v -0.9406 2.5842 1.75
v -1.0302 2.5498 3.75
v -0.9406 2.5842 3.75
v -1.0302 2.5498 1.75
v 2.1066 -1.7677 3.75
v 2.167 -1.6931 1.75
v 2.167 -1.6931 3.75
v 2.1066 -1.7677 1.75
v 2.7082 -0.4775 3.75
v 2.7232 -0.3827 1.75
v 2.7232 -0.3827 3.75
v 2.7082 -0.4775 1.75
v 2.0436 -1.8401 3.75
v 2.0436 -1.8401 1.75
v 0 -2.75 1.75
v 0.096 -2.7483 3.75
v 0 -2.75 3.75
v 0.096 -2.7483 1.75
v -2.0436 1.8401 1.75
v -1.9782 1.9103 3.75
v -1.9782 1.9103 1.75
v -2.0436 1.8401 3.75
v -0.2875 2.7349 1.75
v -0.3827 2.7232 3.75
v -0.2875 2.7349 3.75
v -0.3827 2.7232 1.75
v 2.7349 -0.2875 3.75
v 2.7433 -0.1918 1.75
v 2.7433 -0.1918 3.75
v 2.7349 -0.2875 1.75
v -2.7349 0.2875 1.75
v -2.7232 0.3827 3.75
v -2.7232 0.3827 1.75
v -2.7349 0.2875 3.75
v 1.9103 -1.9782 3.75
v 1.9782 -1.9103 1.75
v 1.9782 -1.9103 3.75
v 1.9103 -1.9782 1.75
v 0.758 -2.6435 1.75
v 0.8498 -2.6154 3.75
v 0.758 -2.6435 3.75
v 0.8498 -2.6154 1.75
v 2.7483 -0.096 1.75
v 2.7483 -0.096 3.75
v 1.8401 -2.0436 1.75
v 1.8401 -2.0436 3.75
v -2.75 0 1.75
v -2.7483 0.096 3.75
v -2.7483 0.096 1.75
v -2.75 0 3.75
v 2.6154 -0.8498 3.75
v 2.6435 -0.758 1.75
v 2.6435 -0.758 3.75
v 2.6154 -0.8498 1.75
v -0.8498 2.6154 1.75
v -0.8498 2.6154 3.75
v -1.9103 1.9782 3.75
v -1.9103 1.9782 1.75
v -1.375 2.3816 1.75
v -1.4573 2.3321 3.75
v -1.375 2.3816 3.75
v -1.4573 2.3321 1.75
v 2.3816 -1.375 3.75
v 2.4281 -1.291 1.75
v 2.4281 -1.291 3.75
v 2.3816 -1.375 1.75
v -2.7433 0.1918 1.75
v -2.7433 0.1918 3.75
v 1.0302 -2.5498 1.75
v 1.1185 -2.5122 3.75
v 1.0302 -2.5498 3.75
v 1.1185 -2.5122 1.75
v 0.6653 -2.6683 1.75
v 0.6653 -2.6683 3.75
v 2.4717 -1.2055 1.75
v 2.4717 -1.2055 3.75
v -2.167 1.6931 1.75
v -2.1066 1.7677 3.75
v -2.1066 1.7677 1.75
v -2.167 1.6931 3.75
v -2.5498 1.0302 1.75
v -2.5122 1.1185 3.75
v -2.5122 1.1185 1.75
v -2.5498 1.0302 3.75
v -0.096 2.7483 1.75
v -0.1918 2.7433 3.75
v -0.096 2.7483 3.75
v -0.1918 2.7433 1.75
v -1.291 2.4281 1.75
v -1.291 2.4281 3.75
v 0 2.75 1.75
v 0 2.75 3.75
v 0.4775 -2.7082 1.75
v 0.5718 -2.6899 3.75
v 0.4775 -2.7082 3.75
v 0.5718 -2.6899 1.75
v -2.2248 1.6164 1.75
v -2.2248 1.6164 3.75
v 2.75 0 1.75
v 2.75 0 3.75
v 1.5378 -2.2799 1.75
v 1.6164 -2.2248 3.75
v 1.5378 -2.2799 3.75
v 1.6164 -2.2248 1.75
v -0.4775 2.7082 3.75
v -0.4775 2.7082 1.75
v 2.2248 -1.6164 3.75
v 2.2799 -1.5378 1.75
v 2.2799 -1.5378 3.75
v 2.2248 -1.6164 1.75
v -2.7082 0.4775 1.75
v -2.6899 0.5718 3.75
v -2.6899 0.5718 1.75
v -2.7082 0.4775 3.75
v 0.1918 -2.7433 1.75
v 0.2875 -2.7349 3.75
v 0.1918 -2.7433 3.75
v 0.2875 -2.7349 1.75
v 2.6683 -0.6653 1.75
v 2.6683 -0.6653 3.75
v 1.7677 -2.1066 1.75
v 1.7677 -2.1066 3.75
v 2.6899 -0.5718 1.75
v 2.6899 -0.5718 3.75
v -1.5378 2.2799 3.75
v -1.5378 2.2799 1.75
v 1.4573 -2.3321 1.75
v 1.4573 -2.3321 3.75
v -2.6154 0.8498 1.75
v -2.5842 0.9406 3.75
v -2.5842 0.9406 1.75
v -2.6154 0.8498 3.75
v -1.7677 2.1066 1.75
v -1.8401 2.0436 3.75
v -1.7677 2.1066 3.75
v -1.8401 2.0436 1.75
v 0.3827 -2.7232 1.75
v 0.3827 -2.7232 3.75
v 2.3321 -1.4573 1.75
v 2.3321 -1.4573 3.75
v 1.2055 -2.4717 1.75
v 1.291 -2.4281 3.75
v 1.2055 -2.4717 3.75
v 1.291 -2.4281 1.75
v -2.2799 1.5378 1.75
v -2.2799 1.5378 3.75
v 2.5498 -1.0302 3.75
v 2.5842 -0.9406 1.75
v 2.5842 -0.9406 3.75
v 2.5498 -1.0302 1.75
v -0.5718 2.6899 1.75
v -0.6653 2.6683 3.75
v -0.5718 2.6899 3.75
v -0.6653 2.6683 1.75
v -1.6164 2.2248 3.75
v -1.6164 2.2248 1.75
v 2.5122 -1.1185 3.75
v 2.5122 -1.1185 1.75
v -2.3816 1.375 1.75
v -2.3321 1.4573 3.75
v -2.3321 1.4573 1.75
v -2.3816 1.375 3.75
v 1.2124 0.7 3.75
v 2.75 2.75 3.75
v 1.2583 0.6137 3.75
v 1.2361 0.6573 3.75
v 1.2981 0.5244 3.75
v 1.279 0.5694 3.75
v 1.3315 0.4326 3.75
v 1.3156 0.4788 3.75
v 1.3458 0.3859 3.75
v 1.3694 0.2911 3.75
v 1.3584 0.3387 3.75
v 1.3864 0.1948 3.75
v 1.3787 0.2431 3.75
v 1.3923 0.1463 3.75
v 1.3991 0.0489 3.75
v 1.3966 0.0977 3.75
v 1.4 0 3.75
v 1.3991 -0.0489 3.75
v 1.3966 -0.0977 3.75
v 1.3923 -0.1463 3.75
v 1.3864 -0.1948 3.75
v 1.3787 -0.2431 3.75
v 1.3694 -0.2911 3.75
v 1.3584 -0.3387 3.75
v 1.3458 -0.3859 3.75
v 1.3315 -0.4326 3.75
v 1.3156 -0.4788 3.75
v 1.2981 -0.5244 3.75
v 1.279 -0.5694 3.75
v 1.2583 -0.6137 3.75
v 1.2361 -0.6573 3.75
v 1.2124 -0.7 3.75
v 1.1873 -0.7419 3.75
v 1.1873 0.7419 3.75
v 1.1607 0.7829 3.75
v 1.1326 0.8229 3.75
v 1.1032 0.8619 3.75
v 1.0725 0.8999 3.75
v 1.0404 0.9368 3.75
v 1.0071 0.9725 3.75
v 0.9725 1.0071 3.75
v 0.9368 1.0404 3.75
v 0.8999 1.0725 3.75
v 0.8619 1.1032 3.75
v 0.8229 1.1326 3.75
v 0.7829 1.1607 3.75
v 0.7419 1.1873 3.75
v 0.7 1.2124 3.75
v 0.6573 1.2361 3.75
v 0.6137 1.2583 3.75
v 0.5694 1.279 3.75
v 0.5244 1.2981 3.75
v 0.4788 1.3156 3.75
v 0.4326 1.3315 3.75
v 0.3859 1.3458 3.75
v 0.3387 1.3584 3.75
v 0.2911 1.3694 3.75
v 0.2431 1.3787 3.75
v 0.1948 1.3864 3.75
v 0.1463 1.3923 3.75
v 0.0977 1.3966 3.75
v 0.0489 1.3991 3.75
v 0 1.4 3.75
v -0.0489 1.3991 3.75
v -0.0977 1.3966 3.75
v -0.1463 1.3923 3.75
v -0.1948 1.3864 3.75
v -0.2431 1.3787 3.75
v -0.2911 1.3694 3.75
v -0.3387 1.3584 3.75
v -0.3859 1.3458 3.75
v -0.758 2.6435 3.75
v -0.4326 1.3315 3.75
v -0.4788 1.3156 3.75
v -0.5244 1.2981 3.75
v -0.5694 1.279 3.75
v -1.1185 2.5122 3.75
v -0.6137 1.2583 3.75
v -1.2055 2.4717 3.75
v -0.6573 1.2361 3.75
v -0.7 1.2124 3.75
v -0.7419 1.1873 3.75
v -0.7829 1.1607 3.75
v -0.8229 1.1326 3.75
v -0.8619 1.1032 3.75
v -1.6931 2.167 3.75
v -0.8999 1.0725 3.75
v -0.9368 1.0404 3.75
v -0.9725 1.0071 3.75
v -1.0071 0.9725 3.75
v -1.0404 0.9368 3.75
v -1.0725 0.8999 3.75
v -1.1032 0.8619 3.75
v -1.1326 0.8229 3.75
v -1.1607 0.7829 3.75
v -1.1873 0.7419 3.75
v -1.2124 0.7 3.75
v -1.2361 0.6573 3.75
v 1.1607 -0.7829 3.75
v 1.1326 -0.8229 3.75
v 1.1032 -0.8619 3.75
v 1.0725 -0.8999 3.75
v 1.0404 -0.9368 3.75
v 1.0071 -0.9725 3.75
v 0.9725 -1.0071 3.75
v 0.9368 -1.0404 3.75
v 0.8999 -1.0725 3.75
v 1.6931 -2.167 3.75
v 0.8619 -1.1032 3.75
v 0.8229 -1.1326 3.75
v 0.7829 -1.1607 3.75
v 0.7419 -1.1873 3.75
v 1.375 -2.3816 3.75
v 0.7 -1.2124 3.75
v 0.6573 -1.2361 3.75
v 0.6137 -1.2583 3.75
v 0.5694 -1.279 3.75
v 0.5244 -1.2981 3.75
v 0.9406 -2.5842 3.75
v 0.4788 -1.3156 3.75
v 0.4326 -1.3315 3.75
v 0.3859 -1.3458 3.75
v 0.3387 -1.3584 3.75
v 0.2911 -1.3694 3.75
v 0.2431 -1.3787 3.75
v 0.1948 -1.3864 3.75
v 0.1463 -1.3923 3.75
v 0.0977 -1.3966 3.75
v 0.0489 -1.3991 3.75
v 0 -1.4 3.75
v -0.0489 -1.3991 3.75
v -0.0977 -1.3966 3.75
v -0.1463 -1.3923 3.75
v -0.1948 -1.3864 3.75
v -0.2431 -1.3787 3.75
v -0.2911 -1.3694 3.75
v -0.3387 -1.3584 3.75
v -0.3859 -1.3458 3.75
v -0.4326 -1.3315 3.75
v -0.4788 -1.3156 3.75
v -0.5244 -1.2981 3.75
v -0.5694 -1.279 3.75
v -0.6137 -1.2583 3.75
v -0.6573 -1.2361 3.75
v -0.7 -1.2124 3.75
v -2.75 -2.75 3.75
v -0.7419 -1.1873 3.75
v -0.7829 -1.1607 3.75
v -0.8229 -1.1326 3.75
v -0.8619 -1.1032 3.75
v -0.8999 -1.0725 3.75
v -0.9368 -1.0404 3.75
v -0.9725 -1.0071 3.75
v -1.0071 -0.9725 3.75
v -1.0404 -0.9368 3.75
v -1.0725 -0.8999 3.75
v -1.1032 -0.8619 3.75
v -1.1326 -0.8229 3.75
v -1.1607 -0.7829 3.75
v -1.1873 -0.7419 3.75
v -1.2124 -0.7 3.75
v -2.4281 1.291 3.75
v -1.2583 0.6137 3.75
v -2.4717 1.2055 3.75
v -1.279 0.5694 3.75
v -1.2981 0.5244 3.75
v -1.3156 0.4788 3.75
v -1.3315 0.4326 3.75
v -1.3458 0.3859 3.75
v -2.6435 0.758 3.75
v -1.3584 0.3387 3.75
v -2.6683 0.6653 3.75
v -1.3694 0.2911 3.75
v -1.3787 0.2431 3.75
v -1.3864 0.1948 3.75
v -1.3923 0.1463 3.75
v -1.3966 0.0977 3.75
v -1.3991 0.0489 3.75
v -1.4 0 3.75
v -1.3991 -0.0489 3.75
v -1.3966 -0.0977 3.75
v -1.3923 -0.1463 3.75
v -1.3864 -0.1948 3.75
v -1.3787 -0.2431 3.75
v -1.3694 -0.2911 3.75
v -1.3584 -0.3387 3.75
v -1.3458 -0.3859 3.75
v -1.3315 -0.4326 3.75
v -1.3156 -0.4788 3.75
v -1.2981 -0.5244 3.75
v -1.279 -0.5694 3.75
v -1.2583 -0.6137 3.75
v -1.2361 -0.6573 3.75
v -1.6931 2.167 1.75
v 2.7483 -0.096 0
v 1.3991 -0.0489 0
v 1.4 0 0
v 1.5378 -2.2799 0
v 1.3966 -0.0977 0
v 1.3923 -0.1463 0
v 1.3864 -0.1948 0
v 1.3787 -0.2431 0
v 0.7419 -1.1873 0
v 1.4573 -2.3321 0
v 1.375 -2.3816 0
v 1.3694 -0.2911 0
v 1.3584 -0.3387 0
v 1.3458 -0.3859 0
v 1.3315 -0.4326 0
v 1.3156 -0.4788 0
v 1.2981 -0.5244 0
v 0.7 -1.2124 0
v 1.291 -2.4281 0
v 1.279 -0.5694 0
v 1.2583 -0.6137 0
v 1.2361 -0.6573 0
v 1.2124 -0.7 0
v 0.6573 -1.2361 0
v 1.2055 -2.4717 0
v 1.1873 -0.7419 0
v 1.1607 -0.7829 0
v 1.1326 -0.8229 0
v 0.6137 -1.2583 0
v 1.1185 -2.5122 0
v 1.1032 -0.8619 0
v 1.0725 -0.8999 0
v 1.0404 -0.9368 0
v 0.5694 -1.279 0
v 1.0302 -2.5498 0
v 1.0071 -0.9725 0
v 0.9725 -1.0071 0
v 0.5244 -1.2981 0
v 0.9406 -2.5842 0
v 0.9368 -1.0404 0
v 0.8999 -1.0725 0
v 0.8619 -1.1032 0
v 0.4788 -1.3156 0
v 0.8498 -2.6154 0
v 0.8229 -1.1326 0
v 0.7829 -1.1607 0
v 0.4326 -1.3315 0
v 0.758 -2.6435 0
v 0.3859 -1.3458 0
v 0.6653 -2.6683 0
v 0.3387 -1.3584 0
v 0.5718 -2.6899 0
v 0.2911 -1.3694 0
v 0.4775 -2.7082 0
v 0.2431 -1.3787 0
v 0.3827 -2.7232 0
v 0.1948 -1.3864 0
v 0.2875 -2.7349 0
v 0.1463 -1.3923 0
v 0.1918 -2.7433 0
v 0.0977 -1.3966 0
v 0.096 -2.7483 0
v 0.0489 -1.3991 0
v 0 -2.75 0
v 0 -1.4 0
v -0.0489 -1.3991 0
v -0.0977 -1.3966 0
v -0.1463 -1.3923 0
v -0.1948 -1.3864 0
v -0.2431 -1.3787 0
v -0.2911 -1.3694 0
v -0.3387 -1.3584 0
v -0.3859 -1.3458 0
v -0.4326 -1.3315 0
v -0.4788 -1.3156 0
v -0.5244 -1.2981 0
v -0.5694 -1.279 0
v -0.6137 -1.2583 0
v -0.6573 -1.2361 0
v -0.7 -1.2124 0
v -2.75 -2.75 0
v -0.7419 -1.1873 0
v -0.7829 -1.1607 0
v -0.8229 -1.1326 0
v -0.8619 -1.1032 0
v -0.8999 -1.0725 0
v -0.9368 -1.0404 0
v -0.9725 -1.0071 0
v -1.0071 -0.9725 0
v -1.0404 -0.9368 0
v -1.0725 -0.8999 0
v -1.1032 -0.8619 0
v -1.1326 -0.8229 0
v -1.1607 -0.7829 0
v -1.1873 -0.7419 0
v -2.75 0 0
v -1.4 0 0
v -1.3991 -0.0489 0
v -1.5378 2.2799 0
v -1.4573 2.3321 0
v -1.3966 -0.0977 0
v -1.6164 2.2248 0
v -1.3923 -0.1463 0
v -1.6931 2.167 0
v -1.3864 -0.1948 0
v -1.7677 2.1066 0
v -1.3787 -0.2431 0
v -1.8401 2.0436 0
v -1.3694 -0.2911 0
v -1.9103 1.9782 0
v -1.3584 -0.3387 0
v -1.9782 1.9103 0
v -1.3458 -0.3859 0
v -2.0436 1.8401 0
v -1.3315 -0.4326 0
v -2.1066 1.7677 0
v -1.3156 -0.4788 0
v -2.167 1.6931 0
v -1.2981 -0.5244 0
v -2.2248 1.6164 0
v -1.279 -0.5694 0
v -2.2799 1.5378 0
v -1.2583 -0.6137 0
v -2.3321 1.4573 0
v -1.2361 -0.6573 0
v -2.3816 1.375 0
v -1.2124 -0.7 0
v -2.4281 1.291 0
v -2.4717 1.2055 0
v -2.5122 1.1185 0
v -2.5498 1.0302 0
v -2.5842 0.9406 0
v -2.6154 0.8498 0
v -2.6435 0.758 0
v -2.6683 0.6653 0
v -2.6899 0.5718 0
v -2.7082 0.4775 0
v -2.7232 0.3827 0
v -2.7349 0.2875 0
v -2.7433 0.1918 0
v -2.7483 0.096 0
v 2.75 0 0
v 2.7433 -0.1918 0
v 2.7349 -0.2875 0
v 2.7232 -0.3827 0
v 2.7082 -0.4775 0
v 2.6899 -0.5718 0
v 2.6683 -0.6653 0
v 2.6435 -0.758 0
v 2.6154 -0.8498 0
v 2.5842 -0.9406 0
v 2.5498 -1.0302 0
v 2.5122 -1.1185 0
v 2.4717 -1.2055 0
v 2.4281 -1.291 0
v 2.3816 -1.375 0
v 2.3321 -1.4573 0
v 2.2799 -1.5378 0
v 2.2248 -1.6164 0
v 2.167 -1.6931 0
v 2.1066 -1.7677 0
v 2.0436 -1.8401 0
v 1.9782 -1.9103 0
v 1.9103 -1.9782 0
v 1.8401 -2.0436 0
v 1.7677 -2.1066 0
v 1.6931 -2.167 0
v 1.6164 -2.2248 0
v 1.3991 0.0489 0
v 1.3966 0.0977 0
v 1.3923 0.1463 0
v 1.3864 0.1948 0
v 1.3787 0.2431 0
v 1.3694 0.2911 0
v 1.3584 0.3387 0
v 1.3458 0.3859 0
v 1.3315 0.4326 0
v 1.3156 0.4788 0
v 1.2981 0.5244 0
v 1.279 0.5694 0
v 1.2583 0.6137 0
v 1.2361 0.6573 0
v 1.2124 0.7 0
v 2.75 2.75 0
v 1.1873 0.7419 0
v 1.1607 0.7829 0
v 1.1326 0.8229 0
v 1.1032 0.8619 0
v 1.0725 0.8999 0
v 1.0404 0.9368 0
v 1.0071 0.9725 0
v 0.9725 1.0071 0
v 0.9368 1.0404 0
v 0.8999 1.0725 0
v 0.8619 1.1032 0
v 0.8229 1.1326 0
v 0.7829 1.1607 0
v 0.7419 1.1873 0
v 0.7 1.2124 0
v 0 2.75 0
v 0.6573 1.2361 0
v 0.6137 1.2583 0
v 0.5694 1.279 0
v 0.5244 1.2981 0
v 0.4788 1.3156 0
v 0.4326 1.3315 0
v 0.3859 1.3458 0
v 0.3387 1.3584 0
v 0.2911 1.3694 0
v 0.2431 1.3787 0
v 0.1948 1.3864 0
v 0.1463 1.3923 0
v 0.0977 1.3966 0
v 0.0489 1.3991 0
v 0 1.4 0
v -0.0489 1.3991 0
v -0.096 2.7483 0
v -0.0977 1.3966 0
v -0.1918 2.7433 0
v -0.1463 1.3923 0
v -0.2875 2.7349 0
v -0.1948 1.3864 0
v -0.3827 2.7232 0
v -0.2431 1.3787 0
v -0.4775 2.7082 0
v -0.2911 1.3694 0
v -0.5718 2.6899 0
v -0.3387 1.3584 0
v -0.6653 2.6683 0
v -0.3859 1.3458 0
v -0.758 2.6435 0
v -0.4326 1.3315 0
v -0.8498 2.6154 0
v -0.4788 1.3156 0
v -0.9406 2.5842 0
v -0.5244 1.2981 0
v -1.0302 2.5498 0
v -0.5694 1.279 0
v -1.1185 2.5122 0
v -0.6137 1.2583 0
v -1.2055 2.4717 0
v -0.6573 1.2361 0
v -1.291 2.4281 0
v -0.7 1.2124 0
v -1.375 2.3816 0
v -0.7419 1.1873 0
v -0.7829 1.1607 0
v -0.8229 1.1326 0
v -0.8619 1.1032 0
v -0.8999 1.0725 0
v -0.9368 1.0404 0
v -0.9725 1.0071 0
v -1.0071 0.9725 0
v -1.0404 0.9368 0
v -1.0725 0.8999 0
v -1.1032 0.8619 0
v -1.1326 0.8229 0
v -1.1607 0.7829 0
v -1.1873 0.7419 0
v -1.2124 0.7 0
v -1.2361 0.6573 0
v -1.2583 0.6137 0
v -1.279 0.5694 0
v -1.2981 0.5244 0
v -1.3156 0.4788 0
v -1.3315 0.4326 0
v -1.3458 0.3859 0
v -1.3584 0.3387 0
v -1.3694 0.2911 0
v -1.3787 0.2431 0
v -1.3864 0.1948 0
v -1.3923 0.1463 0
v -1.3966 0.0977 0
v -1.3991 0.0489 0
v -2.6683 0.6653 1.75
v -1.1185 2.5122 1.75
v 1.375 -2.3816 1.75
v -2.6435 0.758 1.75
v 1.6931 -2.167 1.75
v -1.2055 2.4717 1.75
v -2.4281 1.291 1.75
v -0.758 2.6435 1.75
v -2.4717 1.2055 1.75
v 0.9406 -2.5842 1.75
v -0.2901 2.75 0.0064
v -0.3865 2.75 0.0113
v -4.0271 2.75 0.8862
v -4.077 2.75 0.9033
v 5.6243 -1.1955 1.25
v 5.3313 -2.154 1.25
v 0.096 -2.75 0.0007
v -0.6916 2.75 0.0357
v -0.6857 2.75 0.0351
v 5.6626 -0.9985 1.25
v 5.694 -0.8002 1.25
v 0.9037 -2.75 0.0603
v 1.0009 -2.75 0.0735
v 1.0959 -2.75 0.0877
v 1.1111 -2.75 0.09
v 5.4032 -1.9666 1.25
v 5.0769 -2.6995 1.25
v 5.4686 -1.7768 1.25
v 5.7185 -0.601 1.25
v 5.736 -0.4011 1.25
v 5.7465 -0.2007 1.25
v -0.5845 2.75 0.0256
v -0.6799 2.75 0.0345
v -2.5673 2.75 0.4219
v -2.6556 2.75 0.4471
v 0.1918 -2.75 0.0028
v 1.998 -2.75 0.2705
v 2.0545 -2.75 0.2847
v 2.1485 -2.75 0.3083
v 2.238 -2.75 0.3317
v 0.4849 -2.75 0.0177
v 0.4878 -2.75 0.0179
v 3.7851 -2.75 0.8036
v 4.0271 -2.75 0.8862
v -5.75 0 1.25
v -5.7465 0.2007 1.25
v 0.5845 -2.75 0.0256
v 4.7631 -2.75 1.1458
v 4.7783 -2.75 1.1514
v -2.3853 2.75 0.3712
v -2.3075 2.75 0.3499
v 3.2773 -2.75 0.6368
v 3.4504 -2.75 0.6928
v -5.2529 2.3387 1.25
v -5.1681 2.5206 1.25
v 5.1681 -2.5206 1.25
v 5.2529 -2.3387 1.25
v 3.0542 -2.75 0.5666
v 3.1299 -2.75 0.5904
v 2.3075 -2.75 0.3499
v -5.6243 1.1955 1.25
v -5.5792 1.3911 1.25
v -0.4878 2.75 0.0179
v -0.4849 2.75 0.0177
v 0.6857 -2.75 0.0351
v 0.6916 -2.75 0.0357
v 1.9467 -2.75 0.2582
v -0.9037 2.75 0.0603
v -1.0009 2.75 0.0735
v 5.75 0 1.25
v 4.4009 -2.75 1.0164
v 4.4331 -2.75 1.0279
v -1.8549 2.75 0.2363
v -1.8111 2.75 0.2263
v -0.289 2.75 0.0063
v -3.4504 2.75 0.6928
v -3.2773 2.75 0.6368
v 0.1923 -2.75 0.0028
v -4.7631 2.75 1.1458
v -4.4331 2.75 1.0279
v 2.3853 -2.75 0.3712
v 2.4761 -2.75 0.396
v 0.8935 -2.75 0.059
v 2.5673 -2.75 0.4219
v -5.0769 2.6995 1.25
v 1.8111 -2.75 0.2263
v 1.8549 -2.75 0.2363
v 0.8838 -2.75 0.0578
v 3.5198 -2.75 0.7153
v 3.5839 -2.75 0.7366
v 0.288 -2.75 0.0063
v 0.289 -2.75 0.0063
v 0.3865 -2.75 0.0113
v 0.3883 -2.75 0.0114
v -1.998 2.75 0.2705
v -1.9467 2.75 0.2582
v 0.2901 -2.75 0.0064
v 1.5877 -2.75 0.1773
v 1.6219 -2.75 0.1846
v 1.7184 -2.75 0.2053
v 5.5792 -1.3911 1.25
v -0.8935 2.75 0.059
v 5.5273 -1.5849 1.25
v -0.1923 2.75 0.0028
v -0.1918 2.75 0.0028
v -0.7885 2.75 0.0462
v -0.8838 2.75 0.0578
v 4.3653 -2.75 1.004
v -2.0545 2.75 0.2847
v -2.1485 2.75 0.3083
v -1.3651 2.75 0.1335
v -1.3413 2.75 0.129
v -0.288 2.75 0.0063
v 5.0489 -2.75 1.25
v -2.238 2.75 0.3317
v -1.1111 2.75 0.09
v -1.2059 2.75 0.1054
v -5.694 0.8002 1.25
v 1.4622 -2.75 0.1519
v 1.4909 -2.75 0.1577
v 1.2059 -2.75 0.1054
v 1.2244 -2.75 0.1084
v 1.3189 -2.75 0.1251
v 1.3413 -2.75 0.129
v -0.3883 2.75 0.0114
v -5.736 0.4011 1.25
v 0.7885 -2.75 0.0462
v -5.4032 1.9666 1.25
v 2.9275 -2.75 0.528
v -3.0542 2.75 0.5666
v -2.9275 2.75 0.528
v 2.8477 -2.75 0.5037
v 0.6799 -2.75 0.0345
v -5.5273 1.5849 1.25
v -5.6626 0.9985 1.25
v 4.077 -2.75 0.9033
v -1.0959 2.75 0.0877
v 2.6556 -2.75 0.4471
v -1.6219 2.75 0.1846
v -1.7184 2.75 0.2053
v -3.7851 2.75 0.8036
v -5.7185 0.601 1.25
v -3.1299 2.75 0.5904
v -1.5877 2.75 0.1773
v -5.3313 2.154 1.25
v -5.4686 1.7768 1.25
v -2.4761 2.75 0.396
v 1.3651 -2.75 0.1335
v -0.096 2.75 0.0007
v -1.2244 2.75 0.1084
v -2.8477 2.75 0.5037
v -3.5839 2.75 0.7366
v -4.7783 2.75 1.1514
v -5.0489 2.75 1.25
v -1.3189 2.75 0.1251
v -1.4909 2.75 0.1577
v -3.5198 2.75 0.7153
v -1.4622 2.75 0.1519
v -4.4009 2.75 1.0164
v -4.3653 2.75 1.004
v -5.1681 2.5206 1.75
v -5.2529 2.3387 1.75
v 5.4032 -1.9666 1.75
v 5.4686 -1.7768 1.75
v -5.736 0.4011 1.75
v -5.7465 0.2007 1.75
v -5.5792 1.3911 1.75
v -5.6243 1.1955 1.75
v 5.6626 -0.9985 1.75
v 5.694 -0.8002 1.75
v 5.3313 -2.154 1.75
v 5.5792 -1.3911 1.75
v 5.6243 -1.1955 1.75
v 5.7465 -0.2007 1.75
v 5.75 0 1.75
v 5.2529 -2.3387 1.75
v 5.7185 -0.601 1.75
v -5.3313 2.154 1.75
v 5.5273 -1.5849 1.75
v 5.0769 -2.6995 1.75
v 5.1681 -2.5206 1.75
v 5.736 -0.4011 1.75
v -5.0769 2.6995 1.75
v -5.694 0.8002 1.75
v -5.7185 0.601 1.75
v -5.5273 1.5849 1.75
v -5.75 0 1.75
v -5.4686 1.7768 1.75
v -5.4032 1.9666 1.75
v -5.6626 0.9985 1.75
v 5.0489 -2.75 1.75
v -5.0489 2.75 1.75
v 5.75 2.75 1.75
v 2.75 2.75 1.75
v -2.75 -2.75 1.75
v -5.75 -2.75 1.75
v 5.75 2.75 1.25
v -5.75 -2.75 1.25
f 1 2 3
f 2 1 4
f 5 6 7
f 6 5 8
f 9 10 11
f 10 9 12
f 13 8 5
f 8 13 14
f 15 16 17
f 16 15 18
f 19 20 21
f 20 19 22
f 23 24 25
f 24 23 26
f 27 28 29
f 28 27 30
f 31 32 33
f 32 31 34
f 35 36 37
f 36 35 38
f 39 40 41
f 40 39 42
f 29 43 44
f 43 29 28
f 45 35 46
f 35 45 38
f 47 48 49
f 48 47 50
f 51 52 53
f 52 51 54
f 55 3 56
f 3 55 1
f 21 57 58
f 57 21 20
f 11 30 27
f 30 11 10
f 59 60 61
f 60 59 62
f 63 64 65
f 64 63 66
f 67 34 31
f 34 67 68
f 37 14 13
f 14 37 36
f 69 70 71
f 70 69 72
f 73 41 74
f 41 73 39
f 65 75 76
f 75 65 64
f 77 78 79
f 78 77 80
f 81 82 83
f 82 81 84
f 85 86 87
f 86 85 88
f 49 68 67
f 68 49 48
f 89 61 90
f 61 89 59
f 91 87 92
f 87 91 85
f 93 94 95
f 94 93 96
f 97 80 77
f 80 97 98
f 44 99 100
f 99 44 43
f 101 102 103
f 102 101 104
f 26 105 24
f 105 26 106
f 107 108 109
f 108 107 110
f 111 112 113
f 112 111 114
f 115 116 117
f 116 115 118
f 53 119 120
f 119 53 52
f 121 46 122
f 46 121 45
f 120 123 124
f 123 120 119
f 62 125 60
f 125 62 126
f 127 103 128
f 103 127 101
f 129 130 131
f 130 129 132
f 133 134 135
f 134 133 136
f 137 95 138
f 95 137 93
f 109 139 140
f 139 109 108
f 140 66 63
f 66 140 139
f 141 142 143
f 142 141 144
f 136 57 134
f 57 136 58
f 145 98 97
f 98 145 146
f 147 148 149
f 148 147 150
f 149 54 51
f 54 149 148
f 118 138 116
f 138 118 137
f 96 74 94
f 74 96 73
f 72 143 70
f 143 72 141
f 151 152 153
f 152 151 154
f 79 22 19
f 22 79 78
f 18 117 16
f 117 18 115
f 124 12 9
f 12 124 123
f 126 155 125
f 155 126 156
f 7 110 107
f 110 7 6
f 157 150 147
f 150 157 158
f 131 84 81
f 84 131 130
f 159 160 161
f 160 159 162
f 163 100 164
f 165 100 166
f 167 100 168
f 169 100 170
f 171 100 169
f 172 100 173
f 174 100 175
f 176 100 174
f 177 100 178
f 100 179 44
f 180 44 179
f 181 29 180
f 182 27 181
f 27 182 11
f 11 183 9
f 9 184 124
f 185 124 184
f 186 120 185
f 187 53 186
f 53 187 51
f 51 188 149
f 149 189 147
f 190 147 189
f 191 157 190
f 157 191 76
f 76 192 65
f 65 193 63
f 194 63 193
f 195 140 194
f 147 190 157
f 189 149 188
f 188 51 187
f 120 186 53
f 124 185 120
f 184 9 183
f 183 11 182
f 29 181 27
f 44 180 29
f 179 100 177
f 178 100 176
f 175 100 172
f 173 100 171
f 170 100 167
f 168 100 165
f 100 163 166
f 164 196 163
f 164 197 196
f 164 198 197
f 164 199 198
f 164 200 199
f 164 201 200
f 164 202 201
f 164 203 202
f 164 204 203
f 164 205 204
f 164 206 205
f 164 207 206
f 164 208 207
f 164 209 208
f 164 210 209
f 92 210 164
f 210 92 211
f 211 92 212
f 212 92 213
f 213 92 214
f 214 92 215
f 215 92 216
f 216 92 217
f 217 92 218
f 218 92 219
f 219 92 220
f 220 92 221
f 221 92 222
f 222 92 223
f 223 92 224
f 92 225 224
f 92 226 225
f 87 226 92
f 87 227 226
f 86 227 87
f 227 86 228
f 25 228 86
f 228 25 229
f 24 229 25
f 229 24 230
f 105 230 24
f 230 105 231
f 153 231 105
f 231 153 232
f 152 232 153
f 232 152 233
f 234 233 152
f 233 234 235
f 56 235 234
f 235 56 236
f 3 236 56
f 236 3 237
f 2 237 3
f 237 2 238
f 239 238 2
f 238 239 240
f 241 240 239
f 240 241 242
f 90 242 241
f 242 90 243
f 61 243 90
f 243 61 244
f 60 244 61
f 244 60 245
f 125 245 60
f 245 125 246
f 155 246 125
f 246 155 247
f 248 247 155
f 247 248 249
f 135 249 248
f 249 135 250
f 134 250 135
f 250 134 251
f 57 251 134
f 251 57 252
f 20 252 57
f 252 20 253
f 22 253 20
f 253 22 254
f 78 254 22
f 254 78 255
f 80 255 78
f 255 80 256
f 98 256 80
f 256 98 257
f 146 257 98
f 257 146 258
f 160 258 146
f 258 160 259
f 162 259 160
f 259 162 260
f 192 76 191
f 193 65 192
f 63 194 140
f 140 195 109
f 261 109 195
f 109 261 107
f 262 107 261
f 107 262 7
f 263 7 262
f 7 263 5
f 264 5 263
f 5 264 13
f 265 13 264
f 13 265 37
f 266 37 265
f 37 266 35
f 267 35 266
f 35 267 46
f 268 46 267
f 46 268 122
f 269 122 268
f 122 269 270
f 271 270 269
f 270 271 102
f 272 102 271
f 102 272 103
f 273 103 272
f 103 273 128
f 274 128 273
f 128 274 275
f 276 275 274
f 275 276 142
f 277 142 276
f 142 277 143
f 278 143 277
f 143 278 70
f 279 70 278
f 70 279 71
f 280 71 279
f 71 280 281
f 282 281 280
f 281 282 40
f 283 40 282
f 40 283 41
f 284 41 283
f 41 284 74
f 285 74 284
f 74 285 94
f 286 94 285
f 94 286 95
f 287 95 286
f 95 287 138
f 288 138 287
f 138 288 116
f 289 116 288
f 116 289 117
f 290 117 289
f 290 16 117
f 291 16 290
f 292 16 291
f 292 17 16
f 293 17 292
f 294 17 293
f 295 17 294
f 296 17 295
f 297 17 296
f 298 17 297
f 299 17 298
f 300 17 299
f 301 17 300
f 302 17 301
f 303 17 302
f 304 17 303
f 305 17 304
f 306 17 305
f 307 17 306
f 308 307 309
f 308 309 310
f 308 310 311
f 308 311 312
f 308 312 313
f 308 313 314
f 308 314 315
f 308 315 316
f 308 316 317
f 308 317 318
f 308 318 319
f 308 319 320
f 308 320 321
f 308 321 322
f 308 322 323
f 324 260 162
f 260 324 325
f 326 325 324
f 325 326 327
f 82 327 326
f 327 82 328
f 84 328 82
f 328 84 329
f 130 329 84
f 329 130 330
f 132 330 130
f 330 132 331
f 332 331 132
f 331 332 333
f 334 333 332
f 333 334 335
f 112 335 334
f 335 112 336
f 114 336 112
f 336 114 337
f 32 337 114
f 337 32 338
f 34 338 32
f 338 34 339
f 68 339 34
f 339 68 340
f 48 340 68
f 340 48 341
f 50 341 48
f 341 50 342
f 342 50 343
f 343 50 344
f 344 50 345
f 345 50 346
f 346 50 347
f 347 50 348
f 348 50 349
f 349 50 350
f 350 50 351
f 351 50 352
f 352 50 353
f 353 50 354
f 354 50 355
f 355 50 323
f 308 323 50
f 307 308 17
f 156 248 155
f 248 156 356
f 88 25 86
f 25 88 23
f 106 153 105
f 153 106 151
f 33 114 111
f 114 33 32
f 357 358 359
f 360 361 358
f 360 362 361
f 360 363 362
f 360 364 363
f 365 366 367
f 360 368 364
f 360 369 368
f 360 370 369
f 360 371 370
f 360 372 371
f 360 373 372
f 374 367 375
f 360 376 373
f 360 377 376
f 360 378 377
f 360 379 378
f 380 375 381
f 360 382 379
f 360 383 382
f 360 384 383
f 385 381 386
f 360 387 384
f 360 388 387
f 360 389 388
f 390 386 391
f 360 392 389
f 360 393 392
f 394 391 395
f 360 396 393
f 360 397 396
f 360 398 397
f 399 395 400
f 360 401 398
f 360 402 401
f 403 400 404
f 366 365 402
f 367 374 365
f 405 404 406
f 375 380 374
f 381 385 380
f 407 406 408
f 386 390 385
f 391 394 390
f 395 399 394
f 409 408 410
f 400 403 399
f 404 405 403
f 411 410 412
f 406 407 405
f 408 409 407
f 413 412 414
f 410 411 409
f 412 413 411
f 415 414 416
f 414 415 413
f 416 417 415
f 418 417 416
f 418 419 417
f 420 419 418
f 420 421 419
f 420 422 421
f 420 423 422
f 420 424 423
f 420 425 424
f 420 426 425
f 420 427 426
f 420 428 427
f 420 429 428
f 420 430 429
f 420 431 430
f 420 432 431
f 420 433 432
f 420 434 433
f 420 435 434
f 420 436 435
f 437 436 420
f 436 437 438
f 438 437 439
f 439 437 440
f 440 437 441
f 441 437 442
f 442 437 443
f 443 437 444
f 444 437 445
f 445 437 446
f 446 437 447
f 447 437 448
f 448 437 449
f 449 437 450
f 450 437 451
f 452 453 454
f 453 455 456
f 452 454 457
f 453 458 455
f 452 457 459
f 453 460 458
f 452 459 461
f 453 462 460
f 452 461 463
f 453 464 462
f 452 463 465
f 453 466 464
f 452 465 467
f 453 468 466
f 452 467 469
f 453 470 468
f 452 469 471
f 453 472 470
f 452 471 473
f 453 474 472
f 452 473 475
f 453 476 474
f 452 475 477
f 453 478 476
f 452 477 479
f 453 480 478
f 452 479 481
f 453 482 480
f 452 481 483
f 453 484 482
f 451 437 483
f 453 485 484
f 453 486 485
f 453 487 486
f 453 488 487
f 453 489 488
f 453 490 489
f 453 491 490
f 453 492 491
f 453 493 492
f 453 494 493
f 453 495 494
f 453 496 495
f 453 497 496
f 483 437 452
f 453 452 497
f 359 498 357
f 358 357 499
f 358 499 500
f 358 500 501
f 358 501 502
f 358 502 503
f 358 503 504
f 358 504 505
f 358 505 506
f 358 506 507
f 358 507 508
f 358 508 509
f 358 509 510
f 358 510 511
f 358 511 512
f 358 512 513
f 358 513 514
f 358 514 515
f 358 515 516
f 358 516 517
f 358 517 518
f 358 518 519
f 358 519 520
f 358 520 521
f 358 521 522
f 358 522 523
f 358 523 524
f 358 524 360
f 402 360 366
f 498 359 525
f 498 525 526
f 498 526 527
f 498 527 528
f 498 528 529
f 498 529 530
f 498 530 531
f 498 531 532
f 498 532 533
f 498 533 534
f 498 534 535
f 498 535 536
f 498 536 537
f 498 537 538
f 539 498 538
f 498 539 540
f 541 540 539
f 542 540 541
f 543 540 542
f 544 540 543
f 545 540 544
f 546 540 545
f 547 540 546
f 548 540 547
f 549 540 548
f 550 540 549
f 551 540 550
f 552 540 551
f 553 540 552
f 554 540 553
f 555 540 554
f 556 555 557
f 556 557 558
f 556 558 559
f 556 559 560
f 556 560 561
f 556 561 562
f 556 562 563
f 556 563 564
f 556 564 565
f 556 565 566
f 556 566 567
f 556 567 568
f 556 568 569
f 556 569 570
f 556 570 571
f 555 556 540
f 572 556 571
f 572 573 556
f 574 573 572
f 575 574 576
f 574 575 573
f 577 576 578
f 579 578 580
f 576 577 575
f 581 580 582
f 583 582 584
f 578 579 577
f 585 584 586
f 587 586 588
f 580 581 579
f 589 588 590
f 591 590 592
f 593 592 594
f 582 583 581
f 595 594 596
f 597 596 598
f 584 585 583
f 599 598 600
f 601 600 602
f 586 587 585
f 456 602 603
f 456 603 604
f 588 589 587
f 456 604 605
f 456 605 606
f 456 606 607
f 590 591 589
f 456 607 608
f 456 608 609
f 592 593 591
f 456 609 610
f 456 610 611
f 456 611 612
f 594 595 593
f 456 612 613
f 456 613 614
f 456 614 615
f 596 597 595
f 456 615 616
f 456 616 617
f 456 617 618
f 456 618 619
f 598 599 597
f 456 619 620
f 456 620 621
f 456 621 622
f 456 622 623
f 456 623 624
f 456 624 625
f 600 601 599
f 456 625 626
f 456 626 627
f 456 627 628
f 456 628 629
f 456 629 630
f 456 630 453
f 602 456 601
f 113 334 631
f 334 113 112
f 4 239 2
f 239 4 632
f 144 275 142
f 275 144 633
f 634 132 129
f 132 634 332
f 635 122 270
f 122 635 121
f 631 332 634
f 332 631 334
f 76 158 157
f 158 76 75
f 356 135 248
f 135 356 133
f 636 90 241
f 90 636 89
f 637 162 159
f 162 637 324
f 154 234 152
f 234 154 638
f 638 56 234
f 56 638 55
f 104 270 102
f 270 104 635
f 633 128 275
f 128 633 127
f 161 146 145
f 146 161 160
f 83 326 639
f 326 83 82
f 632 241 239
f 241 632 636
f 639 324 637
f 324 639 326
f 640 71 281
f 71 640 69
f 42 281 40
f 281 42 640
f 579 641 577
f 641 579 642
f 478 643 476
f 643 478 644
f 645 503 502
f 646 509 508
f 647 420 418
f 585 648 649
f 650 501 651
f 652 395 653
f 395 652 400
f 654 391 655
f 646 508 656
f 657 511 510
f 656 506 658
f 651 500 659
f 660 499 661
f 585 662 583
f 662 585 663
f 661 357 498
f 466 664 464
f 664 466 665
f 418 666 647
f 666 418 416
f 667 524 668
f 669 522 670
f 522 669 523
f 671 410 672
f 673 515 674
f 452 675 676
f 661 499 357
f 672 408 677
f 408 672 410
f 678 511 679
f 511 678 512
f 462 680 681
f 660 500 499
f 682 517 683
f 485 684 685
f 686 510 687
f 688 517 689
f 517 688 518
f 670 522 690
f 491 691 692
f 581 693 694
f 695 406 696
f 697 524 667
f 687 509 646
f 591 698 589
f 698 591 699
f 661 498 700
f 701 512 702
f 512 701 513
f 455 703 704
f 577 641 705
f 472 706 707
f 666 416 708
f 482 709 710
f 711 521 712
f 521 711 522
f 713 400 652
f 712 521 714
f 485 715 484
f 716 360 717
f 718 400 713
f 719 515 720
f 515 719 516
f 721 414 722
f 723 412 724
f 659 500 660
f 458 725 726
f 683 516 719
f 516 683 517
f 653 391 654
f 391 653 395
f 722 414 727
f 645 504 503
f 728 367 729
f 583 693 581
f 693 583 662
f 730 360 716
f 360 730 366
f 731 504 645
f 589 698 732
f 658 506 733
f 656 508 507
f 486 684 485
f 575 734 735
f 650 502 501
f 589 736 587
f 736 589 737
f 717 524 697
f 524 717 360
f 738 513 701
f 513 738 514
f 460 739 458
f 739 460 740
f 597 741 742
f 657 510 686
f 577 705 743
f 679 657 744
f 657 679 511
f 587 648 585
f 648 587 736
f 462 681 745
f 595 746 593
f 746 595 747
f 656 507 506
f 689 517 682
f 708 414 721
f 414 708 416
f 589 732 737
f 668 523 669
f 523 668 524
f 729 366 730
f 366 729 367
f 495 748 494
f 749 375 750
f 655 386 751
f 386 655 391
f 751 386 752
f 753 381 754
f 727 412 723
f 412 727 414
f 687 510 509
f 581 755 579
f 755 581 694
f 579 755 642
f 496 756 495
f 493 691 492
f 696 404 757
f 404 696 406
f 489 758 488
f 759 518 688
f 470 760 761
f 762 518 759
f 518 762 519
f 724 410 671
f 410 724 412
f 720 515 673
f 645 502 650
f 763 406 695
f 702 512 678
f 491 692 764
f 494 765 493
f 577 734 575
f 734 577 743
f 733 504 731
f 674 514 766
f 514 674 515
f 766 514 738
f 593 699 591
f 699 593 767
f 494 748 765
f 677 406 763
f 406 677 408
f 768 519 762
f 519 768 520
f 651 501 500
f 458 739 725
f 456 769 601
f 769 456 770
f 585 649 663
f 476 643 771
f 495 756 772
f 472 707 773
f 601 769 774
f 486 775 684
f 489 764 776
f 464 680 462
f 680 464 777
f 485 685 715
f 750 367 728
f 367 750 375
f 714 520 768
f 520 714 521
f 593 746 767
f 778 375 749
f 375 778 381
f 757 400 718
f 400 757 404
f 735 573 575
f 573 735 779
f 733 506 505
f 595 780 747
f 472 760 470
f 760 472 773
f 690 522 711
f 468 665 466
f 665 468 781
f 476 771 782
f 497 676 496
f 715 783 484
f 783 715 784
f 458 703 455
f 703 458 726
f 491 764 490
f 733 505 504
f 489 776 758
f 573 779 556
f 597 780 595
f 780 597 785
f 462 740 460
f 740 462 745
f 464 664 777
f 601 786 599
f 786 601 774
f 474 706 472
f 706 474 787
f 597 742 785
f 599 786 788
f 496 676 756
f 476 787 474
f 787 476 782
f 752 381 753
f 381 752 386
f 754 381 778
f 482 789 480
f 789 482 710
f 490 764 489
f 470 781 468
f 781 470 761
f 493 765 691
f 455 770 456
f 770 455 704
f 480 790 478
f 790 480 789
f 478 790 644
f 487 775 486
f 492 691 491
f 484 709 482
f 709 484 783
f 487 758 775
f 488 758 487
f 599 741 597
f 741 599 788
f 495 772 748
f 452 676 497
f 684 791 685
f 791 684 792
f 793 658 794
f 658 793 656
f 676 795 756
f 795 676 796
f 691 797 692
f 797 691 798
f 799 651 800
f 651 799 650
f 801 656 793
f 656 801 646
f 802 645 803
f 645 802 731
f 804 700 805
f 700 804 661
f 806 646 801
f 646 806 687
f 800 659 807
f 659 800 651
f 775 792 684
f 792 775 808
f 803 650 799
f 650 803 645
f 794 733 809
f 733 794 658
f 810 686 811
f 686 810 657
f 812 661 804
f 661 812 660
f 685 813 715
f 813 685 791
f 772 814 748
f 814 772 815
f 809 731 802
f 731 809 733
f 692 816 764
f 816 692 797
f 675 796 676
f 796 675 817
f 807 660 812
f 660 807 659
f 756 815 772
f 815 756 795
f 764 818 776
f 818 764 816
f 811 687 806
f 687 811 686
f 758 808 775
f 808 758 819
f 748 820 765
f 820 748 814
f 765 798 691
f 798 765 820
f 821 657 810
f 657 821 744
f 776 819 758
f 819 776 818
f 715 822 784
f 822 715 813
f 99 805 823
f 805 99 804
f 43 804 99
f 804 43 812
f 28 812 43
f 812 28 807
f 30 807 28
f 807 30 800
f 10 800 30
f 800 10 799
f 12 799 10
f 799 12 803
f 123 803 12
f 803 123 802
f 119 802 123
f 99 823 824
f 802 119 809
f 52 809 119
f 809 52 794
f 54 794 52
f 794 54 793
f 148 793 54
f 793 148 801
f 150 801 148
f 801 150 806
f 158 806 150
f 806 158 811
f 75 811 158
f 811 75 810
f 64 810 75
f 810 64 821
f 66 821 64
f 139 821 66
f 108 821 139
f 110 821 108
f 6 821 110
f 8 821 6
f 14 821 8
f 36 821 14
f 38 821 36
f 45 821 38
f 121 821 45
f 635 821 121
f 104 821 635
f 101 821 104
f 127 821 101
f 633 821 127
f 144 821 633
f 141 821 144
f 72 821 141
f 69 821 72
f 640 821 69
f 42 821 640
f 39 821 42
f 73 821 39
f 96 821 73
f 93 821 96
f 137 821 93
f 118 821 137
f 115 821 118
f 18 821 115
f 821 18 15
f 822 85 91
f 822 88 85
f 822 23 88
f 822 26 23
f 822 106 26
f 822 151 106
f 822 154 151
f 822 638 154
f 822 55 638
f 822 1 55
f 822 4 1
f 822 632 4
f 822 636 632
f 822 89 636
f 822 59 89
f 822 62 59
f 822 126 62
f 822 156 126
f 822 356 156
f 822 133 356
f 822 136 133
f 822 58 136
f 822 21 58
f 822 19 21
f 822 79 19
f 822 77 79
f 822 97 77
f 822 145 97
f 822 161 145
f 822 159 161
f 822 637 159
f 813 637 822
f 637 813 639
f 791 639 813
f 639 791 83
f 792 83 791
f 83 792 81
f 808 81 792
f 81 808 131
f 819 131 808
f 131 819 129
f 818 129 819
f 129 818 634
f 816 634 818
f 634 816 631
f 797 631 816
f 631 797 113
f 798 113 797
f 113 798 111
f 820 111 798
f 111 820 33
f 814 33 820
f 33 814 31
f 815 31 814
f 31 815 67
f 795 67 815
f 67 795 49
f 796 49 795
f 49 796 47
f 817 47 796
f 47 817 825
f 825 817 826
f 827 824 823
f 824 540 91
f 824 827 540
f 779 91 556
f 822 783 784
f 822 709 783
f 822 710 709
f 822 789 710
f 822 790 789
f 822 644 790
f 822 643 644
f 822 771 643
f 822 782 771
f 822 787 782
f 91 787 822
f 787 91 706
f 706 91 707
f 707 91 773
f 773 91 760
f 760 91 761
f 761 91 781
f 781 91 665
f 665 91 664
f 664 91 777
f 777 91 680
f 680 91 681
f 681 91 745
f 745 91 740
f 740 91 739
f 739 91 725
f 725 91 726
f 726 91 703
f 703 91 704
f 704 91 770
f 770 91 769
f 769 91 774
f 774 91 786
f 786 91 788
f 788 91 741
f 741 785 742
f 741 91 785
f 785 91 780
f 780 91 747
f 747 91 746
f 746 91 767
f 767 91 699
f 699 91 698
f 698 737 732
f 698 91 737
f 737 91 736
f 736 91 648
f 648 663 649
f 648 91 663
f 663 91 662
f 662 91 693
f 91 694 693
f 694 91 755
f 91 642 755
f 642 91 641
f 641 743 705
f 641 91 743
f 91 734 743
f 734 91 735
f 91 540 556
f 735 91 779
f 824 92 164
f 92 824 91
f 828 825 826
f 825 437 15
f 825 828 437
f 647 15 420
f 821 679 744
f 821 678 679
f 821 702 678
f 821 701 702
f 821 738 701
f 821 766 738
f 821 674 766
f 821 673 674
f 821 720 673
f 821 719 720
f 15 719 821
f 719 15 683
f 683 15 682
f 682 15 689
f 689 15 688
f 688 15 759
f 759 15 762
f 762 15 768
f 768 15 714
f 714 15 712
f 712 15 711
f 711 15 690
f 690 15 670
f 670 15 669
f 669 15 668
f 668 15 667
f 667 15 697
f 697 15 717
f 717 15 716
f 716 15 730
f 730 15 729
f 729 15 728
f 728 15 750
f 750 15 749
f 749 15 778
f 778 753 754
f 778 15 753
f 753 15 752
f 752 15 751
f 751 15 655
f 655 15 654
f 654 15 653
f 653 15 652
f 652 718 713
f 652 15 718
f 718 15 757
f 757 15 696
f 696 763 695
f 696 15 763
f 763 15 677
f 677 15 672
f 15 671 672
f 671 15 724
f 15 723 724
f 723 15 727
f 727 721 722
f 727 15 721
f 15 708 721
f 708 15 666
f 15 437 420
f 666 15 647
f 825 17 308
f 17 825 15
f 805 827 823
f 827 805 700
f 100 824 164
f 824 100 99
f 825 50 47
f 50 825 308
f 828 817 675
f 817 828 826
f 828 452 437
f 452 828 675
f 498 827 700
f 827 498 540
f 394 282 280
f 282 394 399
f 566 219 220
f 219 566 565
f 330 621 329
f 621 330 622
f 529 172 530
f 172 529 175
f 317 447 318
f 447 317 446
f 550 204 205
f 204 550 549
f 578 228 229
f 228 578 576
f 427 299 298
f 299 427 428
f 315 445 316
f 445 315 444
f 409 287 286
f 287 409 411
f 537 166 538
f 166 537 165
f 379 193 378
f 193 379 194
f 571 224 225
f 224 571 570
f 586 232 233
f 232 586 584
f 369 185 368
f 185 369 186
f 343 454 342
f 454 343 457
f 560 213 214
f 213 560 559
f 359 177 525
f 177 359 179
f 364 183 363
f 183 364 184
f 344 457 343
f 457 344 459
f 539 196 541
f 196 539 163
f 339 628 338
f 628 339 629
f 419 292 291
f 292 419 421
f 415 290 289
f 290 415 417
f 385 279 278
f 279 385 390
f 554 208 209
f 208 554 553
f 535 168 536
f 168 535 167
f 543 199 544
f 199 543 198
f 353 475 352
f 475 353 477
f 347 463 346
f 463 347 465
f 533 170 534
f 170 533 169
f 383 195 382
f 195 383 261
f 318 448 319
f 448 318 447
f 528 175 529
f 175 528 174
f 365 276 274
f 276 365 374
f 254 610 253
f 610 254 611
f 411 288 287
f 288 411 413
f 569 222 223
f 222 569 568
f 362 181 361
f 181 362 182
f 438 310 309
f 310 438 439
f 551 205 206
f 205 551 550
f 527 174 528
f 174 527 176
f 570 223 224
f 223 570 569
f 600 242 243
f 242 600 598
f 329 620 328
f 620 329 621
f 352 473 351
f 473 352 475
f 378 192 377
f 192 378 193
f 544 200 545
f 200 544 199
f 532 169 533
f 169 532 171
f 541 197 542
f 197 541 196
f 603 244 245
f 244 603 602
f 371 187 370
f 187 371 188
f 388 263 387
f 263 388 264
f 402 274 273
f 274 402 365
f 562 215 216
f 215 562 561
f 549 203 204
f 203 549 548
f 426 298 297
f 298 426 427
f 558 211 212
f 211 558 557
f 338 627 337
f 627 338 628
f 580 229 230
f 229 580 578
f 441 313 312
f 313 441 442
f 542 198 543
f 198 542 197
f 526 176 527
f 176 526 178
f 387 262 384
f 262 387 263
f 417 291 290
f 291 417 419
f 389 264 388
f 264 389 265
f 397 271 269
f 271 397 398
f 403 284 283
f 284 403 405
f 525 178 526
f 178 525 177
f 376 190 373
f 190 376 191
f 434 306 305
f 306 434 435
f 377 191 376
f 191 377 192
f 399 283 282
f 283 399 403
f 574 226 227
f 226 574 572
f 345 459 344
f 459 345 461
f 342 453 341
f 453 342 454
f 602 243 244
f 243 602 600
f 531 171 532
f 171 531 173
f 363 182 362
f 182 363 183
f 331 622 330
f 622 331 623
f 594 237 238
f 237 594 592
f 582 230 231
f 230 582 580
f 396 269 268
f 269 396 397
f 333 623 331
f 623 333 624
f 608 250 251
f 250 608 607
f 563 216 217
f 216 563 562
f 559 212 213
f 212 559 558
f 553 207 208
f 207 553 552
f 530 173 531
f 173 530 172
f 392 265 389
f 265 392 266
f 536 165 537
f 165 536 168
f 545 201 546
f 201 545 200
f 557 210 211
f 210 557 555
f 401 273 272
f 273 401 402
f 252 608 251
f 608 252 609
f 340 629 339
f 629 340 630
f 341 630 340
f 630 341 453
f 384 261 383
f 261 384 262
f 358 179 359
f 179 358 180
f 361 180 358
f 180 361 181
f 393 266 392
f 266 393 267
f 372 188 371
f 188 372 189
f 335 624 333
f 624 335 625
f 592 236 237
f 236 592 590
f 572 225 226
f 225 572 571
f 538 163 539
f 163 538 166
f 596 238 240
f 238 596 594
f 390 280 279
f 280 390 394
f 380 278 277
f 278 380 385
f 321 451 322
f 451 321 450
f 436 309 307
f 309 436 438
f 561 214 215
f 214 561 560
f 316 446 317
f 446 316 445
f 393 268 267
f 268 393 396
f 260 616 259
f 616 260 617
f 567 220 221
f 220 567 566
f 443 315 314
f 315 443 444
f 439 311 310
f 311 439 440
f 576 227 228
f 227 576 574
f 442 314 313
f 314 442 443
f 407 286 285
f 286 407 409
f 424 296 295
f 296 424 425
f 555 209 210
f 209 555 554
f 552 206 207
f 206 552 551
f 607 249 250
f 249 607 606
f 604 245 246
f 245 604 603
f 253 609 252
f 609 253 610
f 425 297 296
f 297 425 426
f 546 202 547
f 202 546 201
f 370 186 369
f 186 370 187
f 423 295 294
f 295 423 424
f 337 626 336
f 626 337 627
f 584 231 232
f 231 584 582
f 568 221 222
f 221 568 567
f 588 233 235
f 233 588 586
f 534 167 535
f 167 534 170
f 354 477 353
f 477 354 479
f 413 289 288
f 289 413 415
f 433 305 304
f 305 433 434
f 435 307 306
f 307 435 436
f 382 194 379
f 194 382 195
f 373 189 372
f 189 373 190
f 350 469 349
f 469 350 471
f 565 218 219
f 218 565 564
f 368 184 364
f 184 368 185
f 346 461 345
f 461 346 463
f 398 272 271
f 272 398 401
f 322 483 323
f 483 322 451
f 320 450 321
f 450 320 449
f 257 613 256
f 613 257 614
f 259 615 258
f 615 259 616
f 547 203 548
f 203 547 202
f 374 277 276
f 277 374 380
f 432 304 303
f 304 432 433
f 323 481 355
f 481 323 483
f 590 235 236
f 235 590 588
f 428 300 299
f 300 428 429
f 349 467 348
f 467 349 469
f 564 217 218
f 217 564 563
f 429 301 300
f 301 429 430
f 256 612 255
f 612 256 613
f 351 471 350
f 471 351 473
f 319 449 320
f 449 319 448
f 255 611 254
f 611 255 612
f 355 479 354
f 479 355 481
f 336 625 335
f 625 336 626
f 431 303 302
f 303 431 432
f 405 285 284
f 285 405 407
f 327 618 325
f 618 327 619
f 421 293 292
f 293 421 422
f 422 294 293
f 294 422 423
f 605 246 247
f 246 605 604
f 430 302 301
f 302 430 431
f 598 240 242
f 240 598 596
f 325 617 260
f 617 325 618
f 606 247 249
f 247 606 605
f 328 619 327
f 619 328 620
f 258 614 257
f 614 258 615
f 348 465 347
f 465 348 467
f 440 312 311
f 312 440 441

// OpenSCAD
/* Printable hammer-style t-nut by Tomi T. Salo <ttsalo@iki.fi> 2013 */

$fn=180;

slot_depth = 4;
slot_width = 6;
slot_total_width = 12;
slot_bottom_width = 6;
slot_lip = 2;
slot_shoulder = 0.5;
tol = 0.25;

module rect_nut(length) {
  translate([0, length/2, 0])
    rotate([90, 0, 0])
      linear_extrude(height=length)
        polygon([[-slot_width/2 + tol, slot_depth - tol], 
                 [slot_width/2 - tol, slot_depth - tol], 
                 [slot_width/2 - tol, slot_depth - slot_lip - tol],
                 [slot_total_width/2 - tol, slot_depth - slot_lip - tol],
                 [slot_total_width/2 - tol, 
                  slot_depth - slot_lip - slot_shoulder - tol],
                 [slot_bottom_width/2 - tol, 0],
                 [- slot_bottom_width/2 + tol, 0],
                 [- slot_total_width/2 + tol, 
                  slot_depth - slot_lip - slot_shoulder - tol],
                 [- slot_total_width/2 + tol, slot_depth - slot_lip - tol],
                 [- slot_width/2 + tol, slot_depth - slot_lip - tol],
                 ]);
}

module round_nut() {
  cylinder(r=slot_width/2-tol, h=slot_depth - tol);
  cylinder(r1=slot_bottom_width/2-tol, r2=slot_total_width/2-tol, 
           h=slot_depth - slot_lip - slot_shoulder - tol);
  translate([0, 0, slot_depth - slot_lip - slot_shoulder - tol])
  cylinder(r=slot_total_width/2-tol, 
           h=slot_shoulder);
}

module hammer_nut(hole_r=0) {
  intersection() {
    union () {
      round_nut();
      difference() {
        rect_nut(slot_width - 2*tol);
        translate([0, -slot_total_width, 0])
          cube([slot_total_width, slot_total_width, slot_depth]);
        translate([-slot_total_width, 0, 0])
          cube([slot_total_width, slot_total_width, slot_depth]);
      }
    }
    difference() {
      translate([- slot_total_width / 2, - (slot_width - tol*2) / 2, 0])
        cube([slot_total_width, slot_width - tol*2, slot_depth]);
      if (hole_r > 0) {
        cylinder(r=hole_r, h=slot_depth);
      }
    }
  }
}

hammer_nut(hole_r=1.4);
